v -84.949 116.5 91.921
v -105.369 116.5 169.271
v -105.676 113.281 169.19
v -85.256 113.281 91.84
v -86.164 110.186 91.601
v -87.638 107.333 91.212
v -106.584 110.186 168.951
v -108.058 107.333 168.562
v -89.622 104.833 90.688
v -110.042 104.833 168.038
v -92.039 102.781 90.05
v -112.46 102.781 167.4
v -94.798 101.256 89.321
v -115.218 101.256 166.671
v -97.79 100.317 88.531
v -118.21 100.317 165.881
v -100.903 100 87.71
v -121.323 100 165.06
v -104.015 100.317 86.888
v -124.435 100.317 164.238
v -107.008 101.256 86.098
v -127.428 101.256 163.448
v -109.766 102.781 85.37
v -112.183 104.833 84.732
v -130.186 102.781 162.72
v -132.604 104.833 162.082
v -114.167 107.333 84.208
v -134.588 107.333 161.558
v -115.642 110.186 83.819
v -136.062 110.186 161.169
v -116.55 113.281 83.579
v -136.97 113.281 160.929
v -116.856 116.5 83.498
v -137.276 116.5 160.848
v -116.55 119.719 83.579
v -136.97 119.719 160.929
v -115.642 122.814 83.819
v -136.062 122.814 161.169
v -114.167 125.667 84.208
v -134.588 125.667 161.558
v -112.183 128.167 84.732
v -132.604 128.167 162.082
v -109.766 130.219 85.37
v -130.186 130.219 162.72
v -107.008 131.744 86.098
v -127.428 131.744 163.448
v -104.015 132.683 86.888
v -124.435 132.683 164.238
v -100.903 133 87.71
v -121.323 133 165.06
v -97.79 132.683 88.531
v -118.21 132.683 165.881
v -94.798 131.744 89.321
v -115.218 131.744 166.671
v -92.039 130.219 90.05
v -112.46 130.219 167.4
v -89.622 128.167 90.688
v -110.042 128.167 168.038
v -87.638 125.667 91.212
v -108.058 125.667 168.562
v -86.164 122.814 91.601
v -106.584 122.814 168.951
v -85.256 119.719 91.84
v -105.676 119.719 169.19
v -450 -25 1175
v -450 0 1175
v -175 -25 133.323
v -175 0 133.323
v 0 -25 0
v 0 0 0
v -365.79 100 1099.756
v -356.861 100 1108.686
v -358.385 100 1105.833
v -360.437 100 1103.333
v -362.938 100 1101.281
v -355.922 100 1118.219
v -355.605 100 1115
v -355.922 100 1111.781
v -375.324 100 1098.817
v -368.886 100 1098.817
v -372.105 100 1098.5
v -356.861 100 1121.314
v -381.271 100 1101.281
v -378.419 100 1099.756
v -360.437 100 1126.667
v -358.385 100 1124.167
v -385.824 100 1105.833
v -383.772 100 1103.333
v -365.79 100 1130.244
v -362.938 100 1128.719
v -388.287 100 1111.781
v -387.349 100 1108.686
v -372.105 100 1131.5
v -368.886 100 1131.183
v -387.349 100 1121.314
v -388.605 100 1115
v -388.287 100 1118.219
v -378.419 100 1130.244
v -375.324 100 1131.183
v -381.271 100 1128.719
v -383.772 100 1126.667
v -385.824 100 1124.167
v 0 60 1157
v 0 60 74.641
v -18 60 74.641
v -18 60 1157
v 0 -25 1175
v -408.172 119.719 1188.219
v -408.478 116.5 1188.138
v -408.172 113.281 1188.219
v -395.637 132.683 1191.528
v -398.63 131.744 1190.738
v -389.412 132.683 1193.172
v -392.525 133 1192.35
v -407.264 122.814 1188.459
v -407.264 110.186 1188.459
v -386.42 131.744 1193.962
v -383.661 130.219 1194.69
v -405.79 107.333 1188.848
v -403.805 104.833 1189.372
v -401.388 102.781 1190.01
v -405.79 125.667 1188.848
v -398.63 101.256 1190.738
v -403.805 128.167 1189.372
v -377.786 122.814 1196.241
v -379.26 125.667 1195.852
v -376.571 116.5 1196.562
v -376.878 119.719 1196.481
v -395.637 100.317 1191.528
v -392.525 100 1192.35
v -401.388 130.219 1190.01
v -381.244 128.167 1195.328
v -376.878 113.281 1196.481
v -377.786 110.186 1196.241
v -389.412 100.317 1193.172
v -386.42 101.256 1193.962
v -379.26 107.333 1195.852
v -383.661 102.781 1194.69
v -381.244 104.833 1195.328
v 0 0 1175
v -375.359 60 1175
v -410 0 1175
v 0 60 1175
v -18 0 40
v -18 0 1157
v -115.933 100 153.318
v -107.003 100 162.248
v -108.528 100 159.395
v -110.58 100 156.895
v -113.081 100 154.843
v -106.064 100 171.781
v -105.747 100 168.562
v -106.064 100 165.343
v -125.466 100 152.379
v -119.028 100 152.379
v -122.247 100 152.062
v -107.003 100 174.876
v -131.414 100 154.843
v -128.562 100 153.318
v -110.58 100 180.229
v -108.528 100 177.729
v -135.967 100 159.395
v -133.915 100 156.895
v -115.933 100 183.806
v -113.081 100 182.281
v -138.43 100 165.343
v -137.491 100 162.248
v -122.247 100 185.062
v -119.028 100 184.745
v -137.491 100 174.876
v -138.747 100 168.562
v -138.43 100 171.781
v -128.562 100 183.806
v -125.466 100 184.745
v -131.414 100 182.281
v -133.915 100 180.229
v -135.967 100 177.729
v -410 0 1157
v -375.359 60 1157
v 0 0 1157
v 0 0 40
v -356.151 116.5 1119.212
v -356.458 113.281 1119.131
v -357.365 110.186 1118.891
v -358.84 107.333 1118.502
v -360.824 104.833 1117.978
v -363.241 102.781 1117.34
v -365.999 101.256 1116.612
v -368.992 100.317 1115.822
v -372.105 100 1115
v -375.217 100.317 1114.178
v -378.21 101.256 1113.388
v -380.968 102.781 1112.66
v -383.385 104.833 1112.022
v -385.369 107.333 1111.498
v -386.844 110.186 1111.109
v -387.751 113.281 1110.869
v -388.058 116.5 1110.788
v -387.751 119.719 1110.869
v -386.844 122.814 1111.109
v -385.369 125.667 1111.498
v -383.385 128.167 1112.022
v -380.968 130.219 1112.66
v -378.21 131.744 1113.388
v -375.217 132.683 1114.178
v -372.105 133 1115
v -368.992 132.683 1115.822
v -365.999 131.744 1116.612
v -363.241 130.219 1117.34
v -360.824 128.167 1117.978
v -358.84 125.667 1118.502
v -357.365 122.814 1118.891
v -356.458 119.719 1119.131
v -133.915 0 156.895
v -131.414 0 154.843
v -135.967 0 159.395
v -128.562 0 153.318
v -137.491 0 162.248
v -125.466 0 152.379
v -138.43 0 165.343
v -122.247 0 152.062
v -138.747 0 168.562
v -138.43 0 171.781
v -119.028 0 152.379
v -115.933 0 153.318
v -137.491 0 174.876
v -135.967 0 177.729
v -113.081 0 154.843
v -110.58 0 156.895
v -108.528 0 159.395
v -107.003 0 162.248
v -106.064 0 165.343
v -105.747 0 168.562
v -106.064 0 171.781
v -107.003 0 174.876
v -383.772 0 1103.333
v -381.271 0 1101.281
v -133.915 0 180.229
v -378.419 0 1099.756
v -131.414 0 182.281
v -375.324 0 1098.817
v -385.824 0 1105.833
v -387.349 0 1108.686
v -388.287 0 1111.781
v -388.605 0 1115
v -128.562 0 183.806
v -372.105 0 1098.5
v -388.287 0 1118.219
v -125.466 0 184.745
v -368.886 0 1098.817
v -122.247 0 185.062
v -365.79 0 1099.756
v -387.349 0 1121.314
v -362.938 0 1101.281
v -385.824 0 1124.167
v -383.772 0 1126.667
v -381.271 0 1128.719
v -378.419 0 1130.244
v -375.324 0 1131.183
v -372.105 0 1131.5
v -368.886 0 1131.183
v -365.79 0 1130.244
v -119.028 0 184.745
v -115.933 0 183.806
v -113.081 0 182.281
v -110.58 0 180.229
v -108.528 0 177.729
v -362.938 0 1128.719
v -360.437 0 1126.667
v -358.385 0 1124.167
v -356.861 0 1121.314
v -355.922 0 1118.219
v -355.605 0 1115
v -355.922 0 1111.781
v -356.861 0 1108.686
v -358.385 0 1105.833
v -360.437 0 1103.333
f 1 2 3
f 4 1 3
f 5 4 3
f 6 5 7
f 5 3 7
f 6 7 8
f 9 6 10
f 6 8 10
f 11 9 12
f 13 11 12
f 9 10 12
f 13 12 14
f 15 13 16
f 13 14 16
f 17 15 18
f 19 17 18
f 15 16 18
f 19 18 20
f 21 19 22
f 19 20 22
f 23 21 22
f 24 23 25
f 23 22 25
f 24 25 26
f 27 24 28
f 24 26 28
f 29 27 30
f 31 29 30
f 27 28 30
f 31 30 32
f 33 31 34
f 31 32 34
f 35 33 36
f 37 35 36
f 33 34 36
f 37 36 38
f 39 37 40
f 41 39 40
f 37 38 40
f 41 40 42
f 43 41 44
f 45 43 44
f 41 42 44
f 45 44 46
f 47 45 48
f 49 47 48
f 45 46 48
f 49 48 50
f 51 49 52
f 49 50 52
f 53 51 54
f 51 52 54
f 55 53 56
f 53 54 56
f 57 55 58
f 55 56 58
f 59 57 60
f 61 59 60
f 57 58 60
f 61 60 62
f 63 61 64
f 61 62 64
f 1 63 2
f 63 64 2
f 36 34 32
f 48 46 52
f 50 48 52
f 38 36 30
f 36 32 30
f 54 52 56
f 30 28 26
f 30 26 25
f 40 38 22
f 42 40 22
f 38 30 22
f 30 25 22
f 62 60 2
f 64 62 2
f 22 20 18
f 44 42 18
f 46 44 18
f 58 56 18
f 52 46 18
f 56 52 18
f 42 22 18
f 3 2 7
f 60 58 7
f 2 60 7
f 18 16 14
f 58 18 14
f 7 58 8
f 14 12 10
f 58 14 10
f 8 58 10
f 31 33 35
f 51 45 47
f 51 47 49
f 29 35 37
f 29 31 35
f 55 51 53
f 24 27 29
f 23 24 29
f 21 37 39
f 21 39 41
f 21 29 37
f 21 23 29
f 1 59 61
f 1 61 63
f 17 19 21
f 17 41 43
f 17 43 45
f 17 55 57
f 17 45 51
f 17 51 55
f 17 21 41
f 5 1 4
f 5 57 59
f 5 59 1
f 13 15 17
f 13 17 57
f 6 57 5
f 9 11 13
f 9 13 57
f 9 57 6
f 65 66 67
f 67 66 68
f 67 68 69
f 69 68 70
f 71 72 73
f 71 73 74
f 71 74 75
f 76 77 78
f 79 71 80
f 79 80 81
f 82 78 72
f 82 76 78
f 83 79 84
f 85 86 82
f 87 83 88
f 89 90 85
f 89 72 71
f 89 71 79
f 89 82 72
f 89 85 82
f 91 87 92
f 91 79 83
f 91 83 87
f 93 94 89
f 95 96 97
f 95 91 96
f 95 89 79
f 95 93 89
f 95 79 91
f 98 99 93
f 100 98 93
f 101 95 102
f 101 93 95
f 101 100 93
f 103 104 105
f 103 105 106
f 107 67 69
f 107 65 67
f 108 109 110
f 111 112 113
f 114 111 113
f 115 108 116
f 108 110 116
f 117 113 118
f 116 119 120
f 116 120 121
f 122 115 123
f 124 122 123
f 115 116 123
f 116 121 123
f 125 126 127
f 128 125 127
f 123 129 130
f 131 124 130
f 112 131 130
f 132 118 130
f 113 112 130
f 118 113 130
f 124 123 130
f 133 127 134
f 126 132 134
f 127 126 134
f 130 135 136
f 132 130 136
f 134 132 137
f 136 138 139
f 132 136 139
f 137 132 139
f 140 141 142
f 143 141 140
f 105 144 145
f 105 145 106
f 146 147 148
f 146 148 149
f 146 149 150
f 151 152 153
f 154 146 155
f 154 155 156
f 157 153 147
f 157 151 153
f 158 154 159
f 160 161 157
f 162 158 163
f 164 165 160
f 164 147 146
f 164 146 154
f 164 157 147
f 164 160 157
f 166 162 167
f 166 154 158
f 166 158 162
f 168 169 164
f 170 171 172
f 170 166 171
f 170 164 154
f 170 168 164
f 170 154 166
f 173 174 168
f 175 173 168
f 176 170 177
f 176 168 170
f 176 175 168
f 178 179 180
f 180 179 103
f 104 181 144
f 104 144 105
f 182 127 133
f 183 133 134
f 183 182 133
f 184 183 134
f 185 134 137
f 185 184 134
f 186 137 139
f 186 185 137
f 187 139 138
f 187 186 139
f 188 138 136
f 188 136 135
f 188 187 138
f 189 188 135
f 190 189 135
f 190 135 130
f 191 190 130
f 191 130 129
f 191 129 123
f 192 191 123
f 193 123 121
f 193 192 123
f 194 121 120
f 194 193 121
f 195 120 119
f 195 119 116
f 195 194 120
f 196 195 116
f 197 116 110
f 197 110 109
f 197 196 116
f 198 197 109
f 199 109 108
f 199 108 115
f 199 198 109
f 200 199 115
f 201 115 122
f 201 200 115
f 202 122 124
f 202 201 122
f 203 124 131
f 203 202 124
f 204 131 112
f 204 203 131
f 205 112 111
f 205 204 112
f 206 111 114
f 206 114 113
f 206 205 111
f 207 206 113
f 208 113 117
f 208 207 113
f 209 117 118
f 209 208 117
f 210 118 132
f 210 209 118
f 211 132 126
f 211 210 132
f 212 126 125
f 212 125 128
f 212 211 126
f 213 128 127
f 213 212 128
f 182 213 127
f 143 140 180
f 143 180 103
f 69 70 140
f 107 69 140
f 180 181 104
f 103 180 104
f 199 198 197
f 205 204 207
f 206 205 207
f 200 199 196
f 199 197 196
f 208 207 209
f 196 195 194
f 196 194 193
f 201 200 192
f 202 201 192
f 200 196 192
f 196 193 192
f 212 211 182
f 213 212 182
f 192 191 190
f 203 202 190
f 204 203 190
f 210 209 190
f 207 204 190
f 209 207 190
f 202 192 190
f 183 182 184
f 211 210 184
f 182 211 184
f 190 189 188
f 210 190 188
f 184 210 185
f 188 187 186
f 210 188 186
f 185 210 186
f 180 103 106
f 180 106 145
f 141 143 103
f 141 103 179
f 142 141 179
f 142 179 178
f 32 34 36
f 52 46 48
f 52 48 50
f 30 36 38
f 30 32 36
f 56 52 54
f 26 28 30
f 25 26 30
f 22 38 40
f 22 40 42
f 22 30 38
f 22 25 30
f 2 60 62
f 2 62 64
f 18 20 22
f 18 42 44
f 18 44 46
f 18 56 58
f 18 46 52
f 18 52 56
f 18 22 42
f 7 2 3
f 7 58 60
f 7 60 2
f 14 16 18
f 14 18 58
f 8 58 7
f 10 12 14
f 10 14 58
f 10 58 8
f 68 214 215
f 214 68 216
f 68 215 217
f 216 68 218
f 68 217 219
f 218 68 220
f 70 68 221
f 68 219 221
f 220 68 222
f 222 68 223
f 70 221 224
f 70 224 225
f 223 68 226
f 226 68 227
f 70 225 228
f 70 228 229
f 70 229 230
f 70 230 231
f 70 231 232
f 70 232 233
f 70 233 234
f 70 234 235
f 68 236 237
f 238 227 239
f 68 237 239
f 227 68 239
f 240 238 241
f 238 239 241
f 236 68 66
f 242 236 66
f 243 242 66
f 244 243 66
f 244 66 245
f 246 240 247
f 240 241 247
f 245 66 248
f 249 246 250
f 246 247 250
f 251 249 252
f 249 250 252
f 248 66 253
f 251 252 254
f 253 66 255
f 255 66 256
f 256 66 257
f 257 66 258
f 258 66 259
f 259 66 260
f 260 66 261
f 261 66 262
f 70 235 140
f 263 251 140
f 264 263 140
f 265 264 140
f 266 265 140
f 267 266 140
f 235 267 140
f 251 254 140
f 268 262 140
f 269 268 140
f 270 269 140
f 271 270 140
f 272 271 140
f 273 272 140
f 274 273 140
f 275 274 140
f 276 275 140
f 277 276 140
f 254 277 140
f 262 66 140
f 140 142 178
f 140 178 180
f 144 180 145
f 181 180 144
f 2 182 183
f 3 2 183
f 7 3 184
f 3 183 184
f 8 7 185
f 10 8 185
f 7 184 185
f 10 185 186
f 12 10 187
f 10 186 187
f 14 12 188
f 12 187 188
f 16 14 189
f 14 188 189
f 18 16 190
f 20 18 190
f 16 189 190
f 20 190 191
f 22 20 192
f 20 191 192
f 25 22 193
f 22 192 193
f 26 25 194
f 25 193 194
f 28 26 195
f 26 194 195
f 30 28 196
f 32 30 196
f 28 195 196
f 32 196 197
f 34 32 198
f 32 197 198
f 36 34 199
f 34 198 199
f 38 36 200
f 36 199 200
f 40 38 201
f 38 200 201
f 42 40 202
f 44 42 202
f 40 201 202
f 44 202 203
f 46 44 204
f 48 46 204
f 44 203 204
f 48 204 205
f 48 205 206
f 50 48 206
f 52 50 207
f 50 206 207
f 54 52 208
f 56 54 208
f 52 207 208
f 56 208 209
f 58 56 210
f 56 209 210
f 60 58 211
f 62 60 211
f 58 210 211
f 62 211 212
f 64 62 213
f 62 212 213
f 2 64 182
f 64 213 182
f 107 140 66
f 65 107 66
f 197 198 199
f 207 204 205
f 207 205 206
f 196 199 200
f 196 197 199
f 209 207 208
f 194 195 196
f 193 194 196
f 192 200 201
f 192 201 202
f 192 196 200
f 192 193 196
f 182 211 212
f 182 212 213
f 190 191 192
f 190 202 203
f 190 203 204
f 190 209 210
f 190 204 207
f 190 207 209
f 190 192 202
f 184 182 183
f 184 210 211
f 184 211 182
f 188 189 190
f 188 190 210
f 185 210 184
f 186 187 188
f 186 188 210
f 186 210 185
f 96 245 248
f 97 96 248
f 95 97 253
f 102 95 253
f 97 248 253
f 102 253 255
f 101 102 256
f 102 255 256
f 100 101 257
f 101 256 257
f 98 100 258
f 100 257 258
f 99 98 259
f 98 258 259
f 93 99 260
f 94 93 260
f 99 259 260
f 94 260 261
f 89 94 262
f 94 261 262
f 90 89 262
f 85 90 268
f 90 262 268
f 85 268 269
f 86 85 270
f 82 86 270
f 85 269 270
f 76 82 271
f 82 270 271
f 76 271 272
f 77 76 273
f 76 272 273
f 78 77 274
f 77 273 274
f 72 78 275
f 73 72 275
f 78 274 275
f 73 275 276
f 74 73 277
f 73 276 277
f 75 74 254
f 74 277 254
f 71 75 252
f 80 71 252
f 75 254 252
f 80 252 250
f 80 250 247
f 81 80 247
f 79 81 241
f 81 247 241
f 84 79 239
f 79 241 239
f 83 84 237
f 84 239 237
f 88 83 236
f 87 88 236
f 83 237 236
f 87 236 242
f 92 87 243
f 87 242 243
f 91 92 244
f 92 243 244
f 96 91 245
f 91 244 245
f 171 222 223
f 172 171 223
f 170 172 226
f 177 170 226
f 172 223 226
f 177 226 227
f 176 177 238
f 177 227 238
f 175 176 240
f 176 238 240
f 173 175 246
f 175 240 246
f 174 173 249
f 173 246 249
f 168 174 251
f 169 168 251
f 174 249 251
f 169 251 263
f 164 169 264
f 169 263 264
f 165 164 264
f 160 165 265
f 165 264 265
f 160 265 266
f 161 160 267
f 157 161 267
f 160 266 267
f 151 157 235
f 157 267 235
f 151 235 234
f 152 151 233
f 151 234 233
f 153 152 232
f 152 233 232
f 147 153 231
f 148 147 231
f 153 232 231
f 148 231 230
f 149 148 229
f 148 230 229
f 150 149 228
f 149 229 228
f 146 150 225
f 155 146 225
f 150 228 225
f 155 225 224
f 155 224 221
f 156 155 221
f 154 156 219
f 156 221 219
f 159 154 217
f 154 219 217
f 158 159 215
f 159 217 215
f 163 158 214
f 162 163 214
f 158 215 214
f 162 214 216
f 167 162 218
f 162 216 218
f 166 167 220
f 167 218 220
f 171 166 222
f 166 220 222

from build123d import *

# Parameters (mm, degrees)
F1_DEPTH  = 25
F2_R      = 16.5
F3_DEPTH  = 100
F6_R      = 16.5
F7_DEPTH  = 982.4856519699
F8_DEPTH  = 80
F9_DEPTH  = 80
F11_DEPTH = 18
F13_DEPTH = 18


with BuildPart() as f1:
    # F0 (on Front) → F1 (new body)
    with BuildSketch(Plane.XZ):
        Polygon((-175, 133.3229162597), (0, 0), (0, 1175), (-450, 1175), align=None)
    extrude(amount=F1_DEPTH)

    # F2 (on face) → F3 (join)
    with BuildSketch(Plane(origin=(0, 0, 0), x_dir=(-1, 0, 0), z_dir=(0, 1, 0))):
        with Locations((372.1045335043, 1115)):
            Circle(F2_R)
        with Locations((122.2474566279, 168.5622138455)):
            Circle(F2_R)
    extrude(amount=F3_DEPTH)


with BuildPart() as f7:
    # F6 (on line) → F7 (new body)
    with BuildSketch(Plane(origin=(-299.4225953601, 0, 1134.1878397842), x_dir=(0.9668744791, 0, 0.2552523099), z_dir=(0.2552523099, 0, -0.9668744791))):
        with Locations((-75.1720515084, -116.5)):
            Circle(F6_R)
    extrude(amount=F7_DEPTH)


with BuildPart() as f8:
    # F8 (new): a face of the model
    f8_faces = [f7.part.faces().sort_by_distance(p)[0] for p in [
        (-372.1045335043, 116.5, 1115),
    ]]
    extrude(f8_faces, amount=F8_DEPTH)


with BuildPart() as f9:
    # F9 (new): a face of the model
    f9_faces = [f7.part.faces().sort_by_distance(p)[0] for p in [
        (-121.322801438, 116.5, 165.0596970396),
    ]]
    extrude(f9_faces, amount=F9_DEPTH)


with BuildPart() as f11:
    # F10 (on face) → F11 (new body)
    with BuildSketch(Plane.XY.offset(1175)):
        Polygon((-410, 0), (0, 0), (0, 60), (-375.3589838486, 60), align=None)
    extrude(amount=-F11_DEPTH)


with BuildPart() as f13:
    # F12 (on face) → F13 (new body)
    with BuildSketch(Plane.YZ):
        Polygon((60, 1157), (0, 1157), (0, 40), (60, 74.6410161514), align=None)
    extrude(amount=-F13_DEPTH)


solid = Compound([f1.part, f7.part, f8.part, f9.part, f11.part, f13.part])
